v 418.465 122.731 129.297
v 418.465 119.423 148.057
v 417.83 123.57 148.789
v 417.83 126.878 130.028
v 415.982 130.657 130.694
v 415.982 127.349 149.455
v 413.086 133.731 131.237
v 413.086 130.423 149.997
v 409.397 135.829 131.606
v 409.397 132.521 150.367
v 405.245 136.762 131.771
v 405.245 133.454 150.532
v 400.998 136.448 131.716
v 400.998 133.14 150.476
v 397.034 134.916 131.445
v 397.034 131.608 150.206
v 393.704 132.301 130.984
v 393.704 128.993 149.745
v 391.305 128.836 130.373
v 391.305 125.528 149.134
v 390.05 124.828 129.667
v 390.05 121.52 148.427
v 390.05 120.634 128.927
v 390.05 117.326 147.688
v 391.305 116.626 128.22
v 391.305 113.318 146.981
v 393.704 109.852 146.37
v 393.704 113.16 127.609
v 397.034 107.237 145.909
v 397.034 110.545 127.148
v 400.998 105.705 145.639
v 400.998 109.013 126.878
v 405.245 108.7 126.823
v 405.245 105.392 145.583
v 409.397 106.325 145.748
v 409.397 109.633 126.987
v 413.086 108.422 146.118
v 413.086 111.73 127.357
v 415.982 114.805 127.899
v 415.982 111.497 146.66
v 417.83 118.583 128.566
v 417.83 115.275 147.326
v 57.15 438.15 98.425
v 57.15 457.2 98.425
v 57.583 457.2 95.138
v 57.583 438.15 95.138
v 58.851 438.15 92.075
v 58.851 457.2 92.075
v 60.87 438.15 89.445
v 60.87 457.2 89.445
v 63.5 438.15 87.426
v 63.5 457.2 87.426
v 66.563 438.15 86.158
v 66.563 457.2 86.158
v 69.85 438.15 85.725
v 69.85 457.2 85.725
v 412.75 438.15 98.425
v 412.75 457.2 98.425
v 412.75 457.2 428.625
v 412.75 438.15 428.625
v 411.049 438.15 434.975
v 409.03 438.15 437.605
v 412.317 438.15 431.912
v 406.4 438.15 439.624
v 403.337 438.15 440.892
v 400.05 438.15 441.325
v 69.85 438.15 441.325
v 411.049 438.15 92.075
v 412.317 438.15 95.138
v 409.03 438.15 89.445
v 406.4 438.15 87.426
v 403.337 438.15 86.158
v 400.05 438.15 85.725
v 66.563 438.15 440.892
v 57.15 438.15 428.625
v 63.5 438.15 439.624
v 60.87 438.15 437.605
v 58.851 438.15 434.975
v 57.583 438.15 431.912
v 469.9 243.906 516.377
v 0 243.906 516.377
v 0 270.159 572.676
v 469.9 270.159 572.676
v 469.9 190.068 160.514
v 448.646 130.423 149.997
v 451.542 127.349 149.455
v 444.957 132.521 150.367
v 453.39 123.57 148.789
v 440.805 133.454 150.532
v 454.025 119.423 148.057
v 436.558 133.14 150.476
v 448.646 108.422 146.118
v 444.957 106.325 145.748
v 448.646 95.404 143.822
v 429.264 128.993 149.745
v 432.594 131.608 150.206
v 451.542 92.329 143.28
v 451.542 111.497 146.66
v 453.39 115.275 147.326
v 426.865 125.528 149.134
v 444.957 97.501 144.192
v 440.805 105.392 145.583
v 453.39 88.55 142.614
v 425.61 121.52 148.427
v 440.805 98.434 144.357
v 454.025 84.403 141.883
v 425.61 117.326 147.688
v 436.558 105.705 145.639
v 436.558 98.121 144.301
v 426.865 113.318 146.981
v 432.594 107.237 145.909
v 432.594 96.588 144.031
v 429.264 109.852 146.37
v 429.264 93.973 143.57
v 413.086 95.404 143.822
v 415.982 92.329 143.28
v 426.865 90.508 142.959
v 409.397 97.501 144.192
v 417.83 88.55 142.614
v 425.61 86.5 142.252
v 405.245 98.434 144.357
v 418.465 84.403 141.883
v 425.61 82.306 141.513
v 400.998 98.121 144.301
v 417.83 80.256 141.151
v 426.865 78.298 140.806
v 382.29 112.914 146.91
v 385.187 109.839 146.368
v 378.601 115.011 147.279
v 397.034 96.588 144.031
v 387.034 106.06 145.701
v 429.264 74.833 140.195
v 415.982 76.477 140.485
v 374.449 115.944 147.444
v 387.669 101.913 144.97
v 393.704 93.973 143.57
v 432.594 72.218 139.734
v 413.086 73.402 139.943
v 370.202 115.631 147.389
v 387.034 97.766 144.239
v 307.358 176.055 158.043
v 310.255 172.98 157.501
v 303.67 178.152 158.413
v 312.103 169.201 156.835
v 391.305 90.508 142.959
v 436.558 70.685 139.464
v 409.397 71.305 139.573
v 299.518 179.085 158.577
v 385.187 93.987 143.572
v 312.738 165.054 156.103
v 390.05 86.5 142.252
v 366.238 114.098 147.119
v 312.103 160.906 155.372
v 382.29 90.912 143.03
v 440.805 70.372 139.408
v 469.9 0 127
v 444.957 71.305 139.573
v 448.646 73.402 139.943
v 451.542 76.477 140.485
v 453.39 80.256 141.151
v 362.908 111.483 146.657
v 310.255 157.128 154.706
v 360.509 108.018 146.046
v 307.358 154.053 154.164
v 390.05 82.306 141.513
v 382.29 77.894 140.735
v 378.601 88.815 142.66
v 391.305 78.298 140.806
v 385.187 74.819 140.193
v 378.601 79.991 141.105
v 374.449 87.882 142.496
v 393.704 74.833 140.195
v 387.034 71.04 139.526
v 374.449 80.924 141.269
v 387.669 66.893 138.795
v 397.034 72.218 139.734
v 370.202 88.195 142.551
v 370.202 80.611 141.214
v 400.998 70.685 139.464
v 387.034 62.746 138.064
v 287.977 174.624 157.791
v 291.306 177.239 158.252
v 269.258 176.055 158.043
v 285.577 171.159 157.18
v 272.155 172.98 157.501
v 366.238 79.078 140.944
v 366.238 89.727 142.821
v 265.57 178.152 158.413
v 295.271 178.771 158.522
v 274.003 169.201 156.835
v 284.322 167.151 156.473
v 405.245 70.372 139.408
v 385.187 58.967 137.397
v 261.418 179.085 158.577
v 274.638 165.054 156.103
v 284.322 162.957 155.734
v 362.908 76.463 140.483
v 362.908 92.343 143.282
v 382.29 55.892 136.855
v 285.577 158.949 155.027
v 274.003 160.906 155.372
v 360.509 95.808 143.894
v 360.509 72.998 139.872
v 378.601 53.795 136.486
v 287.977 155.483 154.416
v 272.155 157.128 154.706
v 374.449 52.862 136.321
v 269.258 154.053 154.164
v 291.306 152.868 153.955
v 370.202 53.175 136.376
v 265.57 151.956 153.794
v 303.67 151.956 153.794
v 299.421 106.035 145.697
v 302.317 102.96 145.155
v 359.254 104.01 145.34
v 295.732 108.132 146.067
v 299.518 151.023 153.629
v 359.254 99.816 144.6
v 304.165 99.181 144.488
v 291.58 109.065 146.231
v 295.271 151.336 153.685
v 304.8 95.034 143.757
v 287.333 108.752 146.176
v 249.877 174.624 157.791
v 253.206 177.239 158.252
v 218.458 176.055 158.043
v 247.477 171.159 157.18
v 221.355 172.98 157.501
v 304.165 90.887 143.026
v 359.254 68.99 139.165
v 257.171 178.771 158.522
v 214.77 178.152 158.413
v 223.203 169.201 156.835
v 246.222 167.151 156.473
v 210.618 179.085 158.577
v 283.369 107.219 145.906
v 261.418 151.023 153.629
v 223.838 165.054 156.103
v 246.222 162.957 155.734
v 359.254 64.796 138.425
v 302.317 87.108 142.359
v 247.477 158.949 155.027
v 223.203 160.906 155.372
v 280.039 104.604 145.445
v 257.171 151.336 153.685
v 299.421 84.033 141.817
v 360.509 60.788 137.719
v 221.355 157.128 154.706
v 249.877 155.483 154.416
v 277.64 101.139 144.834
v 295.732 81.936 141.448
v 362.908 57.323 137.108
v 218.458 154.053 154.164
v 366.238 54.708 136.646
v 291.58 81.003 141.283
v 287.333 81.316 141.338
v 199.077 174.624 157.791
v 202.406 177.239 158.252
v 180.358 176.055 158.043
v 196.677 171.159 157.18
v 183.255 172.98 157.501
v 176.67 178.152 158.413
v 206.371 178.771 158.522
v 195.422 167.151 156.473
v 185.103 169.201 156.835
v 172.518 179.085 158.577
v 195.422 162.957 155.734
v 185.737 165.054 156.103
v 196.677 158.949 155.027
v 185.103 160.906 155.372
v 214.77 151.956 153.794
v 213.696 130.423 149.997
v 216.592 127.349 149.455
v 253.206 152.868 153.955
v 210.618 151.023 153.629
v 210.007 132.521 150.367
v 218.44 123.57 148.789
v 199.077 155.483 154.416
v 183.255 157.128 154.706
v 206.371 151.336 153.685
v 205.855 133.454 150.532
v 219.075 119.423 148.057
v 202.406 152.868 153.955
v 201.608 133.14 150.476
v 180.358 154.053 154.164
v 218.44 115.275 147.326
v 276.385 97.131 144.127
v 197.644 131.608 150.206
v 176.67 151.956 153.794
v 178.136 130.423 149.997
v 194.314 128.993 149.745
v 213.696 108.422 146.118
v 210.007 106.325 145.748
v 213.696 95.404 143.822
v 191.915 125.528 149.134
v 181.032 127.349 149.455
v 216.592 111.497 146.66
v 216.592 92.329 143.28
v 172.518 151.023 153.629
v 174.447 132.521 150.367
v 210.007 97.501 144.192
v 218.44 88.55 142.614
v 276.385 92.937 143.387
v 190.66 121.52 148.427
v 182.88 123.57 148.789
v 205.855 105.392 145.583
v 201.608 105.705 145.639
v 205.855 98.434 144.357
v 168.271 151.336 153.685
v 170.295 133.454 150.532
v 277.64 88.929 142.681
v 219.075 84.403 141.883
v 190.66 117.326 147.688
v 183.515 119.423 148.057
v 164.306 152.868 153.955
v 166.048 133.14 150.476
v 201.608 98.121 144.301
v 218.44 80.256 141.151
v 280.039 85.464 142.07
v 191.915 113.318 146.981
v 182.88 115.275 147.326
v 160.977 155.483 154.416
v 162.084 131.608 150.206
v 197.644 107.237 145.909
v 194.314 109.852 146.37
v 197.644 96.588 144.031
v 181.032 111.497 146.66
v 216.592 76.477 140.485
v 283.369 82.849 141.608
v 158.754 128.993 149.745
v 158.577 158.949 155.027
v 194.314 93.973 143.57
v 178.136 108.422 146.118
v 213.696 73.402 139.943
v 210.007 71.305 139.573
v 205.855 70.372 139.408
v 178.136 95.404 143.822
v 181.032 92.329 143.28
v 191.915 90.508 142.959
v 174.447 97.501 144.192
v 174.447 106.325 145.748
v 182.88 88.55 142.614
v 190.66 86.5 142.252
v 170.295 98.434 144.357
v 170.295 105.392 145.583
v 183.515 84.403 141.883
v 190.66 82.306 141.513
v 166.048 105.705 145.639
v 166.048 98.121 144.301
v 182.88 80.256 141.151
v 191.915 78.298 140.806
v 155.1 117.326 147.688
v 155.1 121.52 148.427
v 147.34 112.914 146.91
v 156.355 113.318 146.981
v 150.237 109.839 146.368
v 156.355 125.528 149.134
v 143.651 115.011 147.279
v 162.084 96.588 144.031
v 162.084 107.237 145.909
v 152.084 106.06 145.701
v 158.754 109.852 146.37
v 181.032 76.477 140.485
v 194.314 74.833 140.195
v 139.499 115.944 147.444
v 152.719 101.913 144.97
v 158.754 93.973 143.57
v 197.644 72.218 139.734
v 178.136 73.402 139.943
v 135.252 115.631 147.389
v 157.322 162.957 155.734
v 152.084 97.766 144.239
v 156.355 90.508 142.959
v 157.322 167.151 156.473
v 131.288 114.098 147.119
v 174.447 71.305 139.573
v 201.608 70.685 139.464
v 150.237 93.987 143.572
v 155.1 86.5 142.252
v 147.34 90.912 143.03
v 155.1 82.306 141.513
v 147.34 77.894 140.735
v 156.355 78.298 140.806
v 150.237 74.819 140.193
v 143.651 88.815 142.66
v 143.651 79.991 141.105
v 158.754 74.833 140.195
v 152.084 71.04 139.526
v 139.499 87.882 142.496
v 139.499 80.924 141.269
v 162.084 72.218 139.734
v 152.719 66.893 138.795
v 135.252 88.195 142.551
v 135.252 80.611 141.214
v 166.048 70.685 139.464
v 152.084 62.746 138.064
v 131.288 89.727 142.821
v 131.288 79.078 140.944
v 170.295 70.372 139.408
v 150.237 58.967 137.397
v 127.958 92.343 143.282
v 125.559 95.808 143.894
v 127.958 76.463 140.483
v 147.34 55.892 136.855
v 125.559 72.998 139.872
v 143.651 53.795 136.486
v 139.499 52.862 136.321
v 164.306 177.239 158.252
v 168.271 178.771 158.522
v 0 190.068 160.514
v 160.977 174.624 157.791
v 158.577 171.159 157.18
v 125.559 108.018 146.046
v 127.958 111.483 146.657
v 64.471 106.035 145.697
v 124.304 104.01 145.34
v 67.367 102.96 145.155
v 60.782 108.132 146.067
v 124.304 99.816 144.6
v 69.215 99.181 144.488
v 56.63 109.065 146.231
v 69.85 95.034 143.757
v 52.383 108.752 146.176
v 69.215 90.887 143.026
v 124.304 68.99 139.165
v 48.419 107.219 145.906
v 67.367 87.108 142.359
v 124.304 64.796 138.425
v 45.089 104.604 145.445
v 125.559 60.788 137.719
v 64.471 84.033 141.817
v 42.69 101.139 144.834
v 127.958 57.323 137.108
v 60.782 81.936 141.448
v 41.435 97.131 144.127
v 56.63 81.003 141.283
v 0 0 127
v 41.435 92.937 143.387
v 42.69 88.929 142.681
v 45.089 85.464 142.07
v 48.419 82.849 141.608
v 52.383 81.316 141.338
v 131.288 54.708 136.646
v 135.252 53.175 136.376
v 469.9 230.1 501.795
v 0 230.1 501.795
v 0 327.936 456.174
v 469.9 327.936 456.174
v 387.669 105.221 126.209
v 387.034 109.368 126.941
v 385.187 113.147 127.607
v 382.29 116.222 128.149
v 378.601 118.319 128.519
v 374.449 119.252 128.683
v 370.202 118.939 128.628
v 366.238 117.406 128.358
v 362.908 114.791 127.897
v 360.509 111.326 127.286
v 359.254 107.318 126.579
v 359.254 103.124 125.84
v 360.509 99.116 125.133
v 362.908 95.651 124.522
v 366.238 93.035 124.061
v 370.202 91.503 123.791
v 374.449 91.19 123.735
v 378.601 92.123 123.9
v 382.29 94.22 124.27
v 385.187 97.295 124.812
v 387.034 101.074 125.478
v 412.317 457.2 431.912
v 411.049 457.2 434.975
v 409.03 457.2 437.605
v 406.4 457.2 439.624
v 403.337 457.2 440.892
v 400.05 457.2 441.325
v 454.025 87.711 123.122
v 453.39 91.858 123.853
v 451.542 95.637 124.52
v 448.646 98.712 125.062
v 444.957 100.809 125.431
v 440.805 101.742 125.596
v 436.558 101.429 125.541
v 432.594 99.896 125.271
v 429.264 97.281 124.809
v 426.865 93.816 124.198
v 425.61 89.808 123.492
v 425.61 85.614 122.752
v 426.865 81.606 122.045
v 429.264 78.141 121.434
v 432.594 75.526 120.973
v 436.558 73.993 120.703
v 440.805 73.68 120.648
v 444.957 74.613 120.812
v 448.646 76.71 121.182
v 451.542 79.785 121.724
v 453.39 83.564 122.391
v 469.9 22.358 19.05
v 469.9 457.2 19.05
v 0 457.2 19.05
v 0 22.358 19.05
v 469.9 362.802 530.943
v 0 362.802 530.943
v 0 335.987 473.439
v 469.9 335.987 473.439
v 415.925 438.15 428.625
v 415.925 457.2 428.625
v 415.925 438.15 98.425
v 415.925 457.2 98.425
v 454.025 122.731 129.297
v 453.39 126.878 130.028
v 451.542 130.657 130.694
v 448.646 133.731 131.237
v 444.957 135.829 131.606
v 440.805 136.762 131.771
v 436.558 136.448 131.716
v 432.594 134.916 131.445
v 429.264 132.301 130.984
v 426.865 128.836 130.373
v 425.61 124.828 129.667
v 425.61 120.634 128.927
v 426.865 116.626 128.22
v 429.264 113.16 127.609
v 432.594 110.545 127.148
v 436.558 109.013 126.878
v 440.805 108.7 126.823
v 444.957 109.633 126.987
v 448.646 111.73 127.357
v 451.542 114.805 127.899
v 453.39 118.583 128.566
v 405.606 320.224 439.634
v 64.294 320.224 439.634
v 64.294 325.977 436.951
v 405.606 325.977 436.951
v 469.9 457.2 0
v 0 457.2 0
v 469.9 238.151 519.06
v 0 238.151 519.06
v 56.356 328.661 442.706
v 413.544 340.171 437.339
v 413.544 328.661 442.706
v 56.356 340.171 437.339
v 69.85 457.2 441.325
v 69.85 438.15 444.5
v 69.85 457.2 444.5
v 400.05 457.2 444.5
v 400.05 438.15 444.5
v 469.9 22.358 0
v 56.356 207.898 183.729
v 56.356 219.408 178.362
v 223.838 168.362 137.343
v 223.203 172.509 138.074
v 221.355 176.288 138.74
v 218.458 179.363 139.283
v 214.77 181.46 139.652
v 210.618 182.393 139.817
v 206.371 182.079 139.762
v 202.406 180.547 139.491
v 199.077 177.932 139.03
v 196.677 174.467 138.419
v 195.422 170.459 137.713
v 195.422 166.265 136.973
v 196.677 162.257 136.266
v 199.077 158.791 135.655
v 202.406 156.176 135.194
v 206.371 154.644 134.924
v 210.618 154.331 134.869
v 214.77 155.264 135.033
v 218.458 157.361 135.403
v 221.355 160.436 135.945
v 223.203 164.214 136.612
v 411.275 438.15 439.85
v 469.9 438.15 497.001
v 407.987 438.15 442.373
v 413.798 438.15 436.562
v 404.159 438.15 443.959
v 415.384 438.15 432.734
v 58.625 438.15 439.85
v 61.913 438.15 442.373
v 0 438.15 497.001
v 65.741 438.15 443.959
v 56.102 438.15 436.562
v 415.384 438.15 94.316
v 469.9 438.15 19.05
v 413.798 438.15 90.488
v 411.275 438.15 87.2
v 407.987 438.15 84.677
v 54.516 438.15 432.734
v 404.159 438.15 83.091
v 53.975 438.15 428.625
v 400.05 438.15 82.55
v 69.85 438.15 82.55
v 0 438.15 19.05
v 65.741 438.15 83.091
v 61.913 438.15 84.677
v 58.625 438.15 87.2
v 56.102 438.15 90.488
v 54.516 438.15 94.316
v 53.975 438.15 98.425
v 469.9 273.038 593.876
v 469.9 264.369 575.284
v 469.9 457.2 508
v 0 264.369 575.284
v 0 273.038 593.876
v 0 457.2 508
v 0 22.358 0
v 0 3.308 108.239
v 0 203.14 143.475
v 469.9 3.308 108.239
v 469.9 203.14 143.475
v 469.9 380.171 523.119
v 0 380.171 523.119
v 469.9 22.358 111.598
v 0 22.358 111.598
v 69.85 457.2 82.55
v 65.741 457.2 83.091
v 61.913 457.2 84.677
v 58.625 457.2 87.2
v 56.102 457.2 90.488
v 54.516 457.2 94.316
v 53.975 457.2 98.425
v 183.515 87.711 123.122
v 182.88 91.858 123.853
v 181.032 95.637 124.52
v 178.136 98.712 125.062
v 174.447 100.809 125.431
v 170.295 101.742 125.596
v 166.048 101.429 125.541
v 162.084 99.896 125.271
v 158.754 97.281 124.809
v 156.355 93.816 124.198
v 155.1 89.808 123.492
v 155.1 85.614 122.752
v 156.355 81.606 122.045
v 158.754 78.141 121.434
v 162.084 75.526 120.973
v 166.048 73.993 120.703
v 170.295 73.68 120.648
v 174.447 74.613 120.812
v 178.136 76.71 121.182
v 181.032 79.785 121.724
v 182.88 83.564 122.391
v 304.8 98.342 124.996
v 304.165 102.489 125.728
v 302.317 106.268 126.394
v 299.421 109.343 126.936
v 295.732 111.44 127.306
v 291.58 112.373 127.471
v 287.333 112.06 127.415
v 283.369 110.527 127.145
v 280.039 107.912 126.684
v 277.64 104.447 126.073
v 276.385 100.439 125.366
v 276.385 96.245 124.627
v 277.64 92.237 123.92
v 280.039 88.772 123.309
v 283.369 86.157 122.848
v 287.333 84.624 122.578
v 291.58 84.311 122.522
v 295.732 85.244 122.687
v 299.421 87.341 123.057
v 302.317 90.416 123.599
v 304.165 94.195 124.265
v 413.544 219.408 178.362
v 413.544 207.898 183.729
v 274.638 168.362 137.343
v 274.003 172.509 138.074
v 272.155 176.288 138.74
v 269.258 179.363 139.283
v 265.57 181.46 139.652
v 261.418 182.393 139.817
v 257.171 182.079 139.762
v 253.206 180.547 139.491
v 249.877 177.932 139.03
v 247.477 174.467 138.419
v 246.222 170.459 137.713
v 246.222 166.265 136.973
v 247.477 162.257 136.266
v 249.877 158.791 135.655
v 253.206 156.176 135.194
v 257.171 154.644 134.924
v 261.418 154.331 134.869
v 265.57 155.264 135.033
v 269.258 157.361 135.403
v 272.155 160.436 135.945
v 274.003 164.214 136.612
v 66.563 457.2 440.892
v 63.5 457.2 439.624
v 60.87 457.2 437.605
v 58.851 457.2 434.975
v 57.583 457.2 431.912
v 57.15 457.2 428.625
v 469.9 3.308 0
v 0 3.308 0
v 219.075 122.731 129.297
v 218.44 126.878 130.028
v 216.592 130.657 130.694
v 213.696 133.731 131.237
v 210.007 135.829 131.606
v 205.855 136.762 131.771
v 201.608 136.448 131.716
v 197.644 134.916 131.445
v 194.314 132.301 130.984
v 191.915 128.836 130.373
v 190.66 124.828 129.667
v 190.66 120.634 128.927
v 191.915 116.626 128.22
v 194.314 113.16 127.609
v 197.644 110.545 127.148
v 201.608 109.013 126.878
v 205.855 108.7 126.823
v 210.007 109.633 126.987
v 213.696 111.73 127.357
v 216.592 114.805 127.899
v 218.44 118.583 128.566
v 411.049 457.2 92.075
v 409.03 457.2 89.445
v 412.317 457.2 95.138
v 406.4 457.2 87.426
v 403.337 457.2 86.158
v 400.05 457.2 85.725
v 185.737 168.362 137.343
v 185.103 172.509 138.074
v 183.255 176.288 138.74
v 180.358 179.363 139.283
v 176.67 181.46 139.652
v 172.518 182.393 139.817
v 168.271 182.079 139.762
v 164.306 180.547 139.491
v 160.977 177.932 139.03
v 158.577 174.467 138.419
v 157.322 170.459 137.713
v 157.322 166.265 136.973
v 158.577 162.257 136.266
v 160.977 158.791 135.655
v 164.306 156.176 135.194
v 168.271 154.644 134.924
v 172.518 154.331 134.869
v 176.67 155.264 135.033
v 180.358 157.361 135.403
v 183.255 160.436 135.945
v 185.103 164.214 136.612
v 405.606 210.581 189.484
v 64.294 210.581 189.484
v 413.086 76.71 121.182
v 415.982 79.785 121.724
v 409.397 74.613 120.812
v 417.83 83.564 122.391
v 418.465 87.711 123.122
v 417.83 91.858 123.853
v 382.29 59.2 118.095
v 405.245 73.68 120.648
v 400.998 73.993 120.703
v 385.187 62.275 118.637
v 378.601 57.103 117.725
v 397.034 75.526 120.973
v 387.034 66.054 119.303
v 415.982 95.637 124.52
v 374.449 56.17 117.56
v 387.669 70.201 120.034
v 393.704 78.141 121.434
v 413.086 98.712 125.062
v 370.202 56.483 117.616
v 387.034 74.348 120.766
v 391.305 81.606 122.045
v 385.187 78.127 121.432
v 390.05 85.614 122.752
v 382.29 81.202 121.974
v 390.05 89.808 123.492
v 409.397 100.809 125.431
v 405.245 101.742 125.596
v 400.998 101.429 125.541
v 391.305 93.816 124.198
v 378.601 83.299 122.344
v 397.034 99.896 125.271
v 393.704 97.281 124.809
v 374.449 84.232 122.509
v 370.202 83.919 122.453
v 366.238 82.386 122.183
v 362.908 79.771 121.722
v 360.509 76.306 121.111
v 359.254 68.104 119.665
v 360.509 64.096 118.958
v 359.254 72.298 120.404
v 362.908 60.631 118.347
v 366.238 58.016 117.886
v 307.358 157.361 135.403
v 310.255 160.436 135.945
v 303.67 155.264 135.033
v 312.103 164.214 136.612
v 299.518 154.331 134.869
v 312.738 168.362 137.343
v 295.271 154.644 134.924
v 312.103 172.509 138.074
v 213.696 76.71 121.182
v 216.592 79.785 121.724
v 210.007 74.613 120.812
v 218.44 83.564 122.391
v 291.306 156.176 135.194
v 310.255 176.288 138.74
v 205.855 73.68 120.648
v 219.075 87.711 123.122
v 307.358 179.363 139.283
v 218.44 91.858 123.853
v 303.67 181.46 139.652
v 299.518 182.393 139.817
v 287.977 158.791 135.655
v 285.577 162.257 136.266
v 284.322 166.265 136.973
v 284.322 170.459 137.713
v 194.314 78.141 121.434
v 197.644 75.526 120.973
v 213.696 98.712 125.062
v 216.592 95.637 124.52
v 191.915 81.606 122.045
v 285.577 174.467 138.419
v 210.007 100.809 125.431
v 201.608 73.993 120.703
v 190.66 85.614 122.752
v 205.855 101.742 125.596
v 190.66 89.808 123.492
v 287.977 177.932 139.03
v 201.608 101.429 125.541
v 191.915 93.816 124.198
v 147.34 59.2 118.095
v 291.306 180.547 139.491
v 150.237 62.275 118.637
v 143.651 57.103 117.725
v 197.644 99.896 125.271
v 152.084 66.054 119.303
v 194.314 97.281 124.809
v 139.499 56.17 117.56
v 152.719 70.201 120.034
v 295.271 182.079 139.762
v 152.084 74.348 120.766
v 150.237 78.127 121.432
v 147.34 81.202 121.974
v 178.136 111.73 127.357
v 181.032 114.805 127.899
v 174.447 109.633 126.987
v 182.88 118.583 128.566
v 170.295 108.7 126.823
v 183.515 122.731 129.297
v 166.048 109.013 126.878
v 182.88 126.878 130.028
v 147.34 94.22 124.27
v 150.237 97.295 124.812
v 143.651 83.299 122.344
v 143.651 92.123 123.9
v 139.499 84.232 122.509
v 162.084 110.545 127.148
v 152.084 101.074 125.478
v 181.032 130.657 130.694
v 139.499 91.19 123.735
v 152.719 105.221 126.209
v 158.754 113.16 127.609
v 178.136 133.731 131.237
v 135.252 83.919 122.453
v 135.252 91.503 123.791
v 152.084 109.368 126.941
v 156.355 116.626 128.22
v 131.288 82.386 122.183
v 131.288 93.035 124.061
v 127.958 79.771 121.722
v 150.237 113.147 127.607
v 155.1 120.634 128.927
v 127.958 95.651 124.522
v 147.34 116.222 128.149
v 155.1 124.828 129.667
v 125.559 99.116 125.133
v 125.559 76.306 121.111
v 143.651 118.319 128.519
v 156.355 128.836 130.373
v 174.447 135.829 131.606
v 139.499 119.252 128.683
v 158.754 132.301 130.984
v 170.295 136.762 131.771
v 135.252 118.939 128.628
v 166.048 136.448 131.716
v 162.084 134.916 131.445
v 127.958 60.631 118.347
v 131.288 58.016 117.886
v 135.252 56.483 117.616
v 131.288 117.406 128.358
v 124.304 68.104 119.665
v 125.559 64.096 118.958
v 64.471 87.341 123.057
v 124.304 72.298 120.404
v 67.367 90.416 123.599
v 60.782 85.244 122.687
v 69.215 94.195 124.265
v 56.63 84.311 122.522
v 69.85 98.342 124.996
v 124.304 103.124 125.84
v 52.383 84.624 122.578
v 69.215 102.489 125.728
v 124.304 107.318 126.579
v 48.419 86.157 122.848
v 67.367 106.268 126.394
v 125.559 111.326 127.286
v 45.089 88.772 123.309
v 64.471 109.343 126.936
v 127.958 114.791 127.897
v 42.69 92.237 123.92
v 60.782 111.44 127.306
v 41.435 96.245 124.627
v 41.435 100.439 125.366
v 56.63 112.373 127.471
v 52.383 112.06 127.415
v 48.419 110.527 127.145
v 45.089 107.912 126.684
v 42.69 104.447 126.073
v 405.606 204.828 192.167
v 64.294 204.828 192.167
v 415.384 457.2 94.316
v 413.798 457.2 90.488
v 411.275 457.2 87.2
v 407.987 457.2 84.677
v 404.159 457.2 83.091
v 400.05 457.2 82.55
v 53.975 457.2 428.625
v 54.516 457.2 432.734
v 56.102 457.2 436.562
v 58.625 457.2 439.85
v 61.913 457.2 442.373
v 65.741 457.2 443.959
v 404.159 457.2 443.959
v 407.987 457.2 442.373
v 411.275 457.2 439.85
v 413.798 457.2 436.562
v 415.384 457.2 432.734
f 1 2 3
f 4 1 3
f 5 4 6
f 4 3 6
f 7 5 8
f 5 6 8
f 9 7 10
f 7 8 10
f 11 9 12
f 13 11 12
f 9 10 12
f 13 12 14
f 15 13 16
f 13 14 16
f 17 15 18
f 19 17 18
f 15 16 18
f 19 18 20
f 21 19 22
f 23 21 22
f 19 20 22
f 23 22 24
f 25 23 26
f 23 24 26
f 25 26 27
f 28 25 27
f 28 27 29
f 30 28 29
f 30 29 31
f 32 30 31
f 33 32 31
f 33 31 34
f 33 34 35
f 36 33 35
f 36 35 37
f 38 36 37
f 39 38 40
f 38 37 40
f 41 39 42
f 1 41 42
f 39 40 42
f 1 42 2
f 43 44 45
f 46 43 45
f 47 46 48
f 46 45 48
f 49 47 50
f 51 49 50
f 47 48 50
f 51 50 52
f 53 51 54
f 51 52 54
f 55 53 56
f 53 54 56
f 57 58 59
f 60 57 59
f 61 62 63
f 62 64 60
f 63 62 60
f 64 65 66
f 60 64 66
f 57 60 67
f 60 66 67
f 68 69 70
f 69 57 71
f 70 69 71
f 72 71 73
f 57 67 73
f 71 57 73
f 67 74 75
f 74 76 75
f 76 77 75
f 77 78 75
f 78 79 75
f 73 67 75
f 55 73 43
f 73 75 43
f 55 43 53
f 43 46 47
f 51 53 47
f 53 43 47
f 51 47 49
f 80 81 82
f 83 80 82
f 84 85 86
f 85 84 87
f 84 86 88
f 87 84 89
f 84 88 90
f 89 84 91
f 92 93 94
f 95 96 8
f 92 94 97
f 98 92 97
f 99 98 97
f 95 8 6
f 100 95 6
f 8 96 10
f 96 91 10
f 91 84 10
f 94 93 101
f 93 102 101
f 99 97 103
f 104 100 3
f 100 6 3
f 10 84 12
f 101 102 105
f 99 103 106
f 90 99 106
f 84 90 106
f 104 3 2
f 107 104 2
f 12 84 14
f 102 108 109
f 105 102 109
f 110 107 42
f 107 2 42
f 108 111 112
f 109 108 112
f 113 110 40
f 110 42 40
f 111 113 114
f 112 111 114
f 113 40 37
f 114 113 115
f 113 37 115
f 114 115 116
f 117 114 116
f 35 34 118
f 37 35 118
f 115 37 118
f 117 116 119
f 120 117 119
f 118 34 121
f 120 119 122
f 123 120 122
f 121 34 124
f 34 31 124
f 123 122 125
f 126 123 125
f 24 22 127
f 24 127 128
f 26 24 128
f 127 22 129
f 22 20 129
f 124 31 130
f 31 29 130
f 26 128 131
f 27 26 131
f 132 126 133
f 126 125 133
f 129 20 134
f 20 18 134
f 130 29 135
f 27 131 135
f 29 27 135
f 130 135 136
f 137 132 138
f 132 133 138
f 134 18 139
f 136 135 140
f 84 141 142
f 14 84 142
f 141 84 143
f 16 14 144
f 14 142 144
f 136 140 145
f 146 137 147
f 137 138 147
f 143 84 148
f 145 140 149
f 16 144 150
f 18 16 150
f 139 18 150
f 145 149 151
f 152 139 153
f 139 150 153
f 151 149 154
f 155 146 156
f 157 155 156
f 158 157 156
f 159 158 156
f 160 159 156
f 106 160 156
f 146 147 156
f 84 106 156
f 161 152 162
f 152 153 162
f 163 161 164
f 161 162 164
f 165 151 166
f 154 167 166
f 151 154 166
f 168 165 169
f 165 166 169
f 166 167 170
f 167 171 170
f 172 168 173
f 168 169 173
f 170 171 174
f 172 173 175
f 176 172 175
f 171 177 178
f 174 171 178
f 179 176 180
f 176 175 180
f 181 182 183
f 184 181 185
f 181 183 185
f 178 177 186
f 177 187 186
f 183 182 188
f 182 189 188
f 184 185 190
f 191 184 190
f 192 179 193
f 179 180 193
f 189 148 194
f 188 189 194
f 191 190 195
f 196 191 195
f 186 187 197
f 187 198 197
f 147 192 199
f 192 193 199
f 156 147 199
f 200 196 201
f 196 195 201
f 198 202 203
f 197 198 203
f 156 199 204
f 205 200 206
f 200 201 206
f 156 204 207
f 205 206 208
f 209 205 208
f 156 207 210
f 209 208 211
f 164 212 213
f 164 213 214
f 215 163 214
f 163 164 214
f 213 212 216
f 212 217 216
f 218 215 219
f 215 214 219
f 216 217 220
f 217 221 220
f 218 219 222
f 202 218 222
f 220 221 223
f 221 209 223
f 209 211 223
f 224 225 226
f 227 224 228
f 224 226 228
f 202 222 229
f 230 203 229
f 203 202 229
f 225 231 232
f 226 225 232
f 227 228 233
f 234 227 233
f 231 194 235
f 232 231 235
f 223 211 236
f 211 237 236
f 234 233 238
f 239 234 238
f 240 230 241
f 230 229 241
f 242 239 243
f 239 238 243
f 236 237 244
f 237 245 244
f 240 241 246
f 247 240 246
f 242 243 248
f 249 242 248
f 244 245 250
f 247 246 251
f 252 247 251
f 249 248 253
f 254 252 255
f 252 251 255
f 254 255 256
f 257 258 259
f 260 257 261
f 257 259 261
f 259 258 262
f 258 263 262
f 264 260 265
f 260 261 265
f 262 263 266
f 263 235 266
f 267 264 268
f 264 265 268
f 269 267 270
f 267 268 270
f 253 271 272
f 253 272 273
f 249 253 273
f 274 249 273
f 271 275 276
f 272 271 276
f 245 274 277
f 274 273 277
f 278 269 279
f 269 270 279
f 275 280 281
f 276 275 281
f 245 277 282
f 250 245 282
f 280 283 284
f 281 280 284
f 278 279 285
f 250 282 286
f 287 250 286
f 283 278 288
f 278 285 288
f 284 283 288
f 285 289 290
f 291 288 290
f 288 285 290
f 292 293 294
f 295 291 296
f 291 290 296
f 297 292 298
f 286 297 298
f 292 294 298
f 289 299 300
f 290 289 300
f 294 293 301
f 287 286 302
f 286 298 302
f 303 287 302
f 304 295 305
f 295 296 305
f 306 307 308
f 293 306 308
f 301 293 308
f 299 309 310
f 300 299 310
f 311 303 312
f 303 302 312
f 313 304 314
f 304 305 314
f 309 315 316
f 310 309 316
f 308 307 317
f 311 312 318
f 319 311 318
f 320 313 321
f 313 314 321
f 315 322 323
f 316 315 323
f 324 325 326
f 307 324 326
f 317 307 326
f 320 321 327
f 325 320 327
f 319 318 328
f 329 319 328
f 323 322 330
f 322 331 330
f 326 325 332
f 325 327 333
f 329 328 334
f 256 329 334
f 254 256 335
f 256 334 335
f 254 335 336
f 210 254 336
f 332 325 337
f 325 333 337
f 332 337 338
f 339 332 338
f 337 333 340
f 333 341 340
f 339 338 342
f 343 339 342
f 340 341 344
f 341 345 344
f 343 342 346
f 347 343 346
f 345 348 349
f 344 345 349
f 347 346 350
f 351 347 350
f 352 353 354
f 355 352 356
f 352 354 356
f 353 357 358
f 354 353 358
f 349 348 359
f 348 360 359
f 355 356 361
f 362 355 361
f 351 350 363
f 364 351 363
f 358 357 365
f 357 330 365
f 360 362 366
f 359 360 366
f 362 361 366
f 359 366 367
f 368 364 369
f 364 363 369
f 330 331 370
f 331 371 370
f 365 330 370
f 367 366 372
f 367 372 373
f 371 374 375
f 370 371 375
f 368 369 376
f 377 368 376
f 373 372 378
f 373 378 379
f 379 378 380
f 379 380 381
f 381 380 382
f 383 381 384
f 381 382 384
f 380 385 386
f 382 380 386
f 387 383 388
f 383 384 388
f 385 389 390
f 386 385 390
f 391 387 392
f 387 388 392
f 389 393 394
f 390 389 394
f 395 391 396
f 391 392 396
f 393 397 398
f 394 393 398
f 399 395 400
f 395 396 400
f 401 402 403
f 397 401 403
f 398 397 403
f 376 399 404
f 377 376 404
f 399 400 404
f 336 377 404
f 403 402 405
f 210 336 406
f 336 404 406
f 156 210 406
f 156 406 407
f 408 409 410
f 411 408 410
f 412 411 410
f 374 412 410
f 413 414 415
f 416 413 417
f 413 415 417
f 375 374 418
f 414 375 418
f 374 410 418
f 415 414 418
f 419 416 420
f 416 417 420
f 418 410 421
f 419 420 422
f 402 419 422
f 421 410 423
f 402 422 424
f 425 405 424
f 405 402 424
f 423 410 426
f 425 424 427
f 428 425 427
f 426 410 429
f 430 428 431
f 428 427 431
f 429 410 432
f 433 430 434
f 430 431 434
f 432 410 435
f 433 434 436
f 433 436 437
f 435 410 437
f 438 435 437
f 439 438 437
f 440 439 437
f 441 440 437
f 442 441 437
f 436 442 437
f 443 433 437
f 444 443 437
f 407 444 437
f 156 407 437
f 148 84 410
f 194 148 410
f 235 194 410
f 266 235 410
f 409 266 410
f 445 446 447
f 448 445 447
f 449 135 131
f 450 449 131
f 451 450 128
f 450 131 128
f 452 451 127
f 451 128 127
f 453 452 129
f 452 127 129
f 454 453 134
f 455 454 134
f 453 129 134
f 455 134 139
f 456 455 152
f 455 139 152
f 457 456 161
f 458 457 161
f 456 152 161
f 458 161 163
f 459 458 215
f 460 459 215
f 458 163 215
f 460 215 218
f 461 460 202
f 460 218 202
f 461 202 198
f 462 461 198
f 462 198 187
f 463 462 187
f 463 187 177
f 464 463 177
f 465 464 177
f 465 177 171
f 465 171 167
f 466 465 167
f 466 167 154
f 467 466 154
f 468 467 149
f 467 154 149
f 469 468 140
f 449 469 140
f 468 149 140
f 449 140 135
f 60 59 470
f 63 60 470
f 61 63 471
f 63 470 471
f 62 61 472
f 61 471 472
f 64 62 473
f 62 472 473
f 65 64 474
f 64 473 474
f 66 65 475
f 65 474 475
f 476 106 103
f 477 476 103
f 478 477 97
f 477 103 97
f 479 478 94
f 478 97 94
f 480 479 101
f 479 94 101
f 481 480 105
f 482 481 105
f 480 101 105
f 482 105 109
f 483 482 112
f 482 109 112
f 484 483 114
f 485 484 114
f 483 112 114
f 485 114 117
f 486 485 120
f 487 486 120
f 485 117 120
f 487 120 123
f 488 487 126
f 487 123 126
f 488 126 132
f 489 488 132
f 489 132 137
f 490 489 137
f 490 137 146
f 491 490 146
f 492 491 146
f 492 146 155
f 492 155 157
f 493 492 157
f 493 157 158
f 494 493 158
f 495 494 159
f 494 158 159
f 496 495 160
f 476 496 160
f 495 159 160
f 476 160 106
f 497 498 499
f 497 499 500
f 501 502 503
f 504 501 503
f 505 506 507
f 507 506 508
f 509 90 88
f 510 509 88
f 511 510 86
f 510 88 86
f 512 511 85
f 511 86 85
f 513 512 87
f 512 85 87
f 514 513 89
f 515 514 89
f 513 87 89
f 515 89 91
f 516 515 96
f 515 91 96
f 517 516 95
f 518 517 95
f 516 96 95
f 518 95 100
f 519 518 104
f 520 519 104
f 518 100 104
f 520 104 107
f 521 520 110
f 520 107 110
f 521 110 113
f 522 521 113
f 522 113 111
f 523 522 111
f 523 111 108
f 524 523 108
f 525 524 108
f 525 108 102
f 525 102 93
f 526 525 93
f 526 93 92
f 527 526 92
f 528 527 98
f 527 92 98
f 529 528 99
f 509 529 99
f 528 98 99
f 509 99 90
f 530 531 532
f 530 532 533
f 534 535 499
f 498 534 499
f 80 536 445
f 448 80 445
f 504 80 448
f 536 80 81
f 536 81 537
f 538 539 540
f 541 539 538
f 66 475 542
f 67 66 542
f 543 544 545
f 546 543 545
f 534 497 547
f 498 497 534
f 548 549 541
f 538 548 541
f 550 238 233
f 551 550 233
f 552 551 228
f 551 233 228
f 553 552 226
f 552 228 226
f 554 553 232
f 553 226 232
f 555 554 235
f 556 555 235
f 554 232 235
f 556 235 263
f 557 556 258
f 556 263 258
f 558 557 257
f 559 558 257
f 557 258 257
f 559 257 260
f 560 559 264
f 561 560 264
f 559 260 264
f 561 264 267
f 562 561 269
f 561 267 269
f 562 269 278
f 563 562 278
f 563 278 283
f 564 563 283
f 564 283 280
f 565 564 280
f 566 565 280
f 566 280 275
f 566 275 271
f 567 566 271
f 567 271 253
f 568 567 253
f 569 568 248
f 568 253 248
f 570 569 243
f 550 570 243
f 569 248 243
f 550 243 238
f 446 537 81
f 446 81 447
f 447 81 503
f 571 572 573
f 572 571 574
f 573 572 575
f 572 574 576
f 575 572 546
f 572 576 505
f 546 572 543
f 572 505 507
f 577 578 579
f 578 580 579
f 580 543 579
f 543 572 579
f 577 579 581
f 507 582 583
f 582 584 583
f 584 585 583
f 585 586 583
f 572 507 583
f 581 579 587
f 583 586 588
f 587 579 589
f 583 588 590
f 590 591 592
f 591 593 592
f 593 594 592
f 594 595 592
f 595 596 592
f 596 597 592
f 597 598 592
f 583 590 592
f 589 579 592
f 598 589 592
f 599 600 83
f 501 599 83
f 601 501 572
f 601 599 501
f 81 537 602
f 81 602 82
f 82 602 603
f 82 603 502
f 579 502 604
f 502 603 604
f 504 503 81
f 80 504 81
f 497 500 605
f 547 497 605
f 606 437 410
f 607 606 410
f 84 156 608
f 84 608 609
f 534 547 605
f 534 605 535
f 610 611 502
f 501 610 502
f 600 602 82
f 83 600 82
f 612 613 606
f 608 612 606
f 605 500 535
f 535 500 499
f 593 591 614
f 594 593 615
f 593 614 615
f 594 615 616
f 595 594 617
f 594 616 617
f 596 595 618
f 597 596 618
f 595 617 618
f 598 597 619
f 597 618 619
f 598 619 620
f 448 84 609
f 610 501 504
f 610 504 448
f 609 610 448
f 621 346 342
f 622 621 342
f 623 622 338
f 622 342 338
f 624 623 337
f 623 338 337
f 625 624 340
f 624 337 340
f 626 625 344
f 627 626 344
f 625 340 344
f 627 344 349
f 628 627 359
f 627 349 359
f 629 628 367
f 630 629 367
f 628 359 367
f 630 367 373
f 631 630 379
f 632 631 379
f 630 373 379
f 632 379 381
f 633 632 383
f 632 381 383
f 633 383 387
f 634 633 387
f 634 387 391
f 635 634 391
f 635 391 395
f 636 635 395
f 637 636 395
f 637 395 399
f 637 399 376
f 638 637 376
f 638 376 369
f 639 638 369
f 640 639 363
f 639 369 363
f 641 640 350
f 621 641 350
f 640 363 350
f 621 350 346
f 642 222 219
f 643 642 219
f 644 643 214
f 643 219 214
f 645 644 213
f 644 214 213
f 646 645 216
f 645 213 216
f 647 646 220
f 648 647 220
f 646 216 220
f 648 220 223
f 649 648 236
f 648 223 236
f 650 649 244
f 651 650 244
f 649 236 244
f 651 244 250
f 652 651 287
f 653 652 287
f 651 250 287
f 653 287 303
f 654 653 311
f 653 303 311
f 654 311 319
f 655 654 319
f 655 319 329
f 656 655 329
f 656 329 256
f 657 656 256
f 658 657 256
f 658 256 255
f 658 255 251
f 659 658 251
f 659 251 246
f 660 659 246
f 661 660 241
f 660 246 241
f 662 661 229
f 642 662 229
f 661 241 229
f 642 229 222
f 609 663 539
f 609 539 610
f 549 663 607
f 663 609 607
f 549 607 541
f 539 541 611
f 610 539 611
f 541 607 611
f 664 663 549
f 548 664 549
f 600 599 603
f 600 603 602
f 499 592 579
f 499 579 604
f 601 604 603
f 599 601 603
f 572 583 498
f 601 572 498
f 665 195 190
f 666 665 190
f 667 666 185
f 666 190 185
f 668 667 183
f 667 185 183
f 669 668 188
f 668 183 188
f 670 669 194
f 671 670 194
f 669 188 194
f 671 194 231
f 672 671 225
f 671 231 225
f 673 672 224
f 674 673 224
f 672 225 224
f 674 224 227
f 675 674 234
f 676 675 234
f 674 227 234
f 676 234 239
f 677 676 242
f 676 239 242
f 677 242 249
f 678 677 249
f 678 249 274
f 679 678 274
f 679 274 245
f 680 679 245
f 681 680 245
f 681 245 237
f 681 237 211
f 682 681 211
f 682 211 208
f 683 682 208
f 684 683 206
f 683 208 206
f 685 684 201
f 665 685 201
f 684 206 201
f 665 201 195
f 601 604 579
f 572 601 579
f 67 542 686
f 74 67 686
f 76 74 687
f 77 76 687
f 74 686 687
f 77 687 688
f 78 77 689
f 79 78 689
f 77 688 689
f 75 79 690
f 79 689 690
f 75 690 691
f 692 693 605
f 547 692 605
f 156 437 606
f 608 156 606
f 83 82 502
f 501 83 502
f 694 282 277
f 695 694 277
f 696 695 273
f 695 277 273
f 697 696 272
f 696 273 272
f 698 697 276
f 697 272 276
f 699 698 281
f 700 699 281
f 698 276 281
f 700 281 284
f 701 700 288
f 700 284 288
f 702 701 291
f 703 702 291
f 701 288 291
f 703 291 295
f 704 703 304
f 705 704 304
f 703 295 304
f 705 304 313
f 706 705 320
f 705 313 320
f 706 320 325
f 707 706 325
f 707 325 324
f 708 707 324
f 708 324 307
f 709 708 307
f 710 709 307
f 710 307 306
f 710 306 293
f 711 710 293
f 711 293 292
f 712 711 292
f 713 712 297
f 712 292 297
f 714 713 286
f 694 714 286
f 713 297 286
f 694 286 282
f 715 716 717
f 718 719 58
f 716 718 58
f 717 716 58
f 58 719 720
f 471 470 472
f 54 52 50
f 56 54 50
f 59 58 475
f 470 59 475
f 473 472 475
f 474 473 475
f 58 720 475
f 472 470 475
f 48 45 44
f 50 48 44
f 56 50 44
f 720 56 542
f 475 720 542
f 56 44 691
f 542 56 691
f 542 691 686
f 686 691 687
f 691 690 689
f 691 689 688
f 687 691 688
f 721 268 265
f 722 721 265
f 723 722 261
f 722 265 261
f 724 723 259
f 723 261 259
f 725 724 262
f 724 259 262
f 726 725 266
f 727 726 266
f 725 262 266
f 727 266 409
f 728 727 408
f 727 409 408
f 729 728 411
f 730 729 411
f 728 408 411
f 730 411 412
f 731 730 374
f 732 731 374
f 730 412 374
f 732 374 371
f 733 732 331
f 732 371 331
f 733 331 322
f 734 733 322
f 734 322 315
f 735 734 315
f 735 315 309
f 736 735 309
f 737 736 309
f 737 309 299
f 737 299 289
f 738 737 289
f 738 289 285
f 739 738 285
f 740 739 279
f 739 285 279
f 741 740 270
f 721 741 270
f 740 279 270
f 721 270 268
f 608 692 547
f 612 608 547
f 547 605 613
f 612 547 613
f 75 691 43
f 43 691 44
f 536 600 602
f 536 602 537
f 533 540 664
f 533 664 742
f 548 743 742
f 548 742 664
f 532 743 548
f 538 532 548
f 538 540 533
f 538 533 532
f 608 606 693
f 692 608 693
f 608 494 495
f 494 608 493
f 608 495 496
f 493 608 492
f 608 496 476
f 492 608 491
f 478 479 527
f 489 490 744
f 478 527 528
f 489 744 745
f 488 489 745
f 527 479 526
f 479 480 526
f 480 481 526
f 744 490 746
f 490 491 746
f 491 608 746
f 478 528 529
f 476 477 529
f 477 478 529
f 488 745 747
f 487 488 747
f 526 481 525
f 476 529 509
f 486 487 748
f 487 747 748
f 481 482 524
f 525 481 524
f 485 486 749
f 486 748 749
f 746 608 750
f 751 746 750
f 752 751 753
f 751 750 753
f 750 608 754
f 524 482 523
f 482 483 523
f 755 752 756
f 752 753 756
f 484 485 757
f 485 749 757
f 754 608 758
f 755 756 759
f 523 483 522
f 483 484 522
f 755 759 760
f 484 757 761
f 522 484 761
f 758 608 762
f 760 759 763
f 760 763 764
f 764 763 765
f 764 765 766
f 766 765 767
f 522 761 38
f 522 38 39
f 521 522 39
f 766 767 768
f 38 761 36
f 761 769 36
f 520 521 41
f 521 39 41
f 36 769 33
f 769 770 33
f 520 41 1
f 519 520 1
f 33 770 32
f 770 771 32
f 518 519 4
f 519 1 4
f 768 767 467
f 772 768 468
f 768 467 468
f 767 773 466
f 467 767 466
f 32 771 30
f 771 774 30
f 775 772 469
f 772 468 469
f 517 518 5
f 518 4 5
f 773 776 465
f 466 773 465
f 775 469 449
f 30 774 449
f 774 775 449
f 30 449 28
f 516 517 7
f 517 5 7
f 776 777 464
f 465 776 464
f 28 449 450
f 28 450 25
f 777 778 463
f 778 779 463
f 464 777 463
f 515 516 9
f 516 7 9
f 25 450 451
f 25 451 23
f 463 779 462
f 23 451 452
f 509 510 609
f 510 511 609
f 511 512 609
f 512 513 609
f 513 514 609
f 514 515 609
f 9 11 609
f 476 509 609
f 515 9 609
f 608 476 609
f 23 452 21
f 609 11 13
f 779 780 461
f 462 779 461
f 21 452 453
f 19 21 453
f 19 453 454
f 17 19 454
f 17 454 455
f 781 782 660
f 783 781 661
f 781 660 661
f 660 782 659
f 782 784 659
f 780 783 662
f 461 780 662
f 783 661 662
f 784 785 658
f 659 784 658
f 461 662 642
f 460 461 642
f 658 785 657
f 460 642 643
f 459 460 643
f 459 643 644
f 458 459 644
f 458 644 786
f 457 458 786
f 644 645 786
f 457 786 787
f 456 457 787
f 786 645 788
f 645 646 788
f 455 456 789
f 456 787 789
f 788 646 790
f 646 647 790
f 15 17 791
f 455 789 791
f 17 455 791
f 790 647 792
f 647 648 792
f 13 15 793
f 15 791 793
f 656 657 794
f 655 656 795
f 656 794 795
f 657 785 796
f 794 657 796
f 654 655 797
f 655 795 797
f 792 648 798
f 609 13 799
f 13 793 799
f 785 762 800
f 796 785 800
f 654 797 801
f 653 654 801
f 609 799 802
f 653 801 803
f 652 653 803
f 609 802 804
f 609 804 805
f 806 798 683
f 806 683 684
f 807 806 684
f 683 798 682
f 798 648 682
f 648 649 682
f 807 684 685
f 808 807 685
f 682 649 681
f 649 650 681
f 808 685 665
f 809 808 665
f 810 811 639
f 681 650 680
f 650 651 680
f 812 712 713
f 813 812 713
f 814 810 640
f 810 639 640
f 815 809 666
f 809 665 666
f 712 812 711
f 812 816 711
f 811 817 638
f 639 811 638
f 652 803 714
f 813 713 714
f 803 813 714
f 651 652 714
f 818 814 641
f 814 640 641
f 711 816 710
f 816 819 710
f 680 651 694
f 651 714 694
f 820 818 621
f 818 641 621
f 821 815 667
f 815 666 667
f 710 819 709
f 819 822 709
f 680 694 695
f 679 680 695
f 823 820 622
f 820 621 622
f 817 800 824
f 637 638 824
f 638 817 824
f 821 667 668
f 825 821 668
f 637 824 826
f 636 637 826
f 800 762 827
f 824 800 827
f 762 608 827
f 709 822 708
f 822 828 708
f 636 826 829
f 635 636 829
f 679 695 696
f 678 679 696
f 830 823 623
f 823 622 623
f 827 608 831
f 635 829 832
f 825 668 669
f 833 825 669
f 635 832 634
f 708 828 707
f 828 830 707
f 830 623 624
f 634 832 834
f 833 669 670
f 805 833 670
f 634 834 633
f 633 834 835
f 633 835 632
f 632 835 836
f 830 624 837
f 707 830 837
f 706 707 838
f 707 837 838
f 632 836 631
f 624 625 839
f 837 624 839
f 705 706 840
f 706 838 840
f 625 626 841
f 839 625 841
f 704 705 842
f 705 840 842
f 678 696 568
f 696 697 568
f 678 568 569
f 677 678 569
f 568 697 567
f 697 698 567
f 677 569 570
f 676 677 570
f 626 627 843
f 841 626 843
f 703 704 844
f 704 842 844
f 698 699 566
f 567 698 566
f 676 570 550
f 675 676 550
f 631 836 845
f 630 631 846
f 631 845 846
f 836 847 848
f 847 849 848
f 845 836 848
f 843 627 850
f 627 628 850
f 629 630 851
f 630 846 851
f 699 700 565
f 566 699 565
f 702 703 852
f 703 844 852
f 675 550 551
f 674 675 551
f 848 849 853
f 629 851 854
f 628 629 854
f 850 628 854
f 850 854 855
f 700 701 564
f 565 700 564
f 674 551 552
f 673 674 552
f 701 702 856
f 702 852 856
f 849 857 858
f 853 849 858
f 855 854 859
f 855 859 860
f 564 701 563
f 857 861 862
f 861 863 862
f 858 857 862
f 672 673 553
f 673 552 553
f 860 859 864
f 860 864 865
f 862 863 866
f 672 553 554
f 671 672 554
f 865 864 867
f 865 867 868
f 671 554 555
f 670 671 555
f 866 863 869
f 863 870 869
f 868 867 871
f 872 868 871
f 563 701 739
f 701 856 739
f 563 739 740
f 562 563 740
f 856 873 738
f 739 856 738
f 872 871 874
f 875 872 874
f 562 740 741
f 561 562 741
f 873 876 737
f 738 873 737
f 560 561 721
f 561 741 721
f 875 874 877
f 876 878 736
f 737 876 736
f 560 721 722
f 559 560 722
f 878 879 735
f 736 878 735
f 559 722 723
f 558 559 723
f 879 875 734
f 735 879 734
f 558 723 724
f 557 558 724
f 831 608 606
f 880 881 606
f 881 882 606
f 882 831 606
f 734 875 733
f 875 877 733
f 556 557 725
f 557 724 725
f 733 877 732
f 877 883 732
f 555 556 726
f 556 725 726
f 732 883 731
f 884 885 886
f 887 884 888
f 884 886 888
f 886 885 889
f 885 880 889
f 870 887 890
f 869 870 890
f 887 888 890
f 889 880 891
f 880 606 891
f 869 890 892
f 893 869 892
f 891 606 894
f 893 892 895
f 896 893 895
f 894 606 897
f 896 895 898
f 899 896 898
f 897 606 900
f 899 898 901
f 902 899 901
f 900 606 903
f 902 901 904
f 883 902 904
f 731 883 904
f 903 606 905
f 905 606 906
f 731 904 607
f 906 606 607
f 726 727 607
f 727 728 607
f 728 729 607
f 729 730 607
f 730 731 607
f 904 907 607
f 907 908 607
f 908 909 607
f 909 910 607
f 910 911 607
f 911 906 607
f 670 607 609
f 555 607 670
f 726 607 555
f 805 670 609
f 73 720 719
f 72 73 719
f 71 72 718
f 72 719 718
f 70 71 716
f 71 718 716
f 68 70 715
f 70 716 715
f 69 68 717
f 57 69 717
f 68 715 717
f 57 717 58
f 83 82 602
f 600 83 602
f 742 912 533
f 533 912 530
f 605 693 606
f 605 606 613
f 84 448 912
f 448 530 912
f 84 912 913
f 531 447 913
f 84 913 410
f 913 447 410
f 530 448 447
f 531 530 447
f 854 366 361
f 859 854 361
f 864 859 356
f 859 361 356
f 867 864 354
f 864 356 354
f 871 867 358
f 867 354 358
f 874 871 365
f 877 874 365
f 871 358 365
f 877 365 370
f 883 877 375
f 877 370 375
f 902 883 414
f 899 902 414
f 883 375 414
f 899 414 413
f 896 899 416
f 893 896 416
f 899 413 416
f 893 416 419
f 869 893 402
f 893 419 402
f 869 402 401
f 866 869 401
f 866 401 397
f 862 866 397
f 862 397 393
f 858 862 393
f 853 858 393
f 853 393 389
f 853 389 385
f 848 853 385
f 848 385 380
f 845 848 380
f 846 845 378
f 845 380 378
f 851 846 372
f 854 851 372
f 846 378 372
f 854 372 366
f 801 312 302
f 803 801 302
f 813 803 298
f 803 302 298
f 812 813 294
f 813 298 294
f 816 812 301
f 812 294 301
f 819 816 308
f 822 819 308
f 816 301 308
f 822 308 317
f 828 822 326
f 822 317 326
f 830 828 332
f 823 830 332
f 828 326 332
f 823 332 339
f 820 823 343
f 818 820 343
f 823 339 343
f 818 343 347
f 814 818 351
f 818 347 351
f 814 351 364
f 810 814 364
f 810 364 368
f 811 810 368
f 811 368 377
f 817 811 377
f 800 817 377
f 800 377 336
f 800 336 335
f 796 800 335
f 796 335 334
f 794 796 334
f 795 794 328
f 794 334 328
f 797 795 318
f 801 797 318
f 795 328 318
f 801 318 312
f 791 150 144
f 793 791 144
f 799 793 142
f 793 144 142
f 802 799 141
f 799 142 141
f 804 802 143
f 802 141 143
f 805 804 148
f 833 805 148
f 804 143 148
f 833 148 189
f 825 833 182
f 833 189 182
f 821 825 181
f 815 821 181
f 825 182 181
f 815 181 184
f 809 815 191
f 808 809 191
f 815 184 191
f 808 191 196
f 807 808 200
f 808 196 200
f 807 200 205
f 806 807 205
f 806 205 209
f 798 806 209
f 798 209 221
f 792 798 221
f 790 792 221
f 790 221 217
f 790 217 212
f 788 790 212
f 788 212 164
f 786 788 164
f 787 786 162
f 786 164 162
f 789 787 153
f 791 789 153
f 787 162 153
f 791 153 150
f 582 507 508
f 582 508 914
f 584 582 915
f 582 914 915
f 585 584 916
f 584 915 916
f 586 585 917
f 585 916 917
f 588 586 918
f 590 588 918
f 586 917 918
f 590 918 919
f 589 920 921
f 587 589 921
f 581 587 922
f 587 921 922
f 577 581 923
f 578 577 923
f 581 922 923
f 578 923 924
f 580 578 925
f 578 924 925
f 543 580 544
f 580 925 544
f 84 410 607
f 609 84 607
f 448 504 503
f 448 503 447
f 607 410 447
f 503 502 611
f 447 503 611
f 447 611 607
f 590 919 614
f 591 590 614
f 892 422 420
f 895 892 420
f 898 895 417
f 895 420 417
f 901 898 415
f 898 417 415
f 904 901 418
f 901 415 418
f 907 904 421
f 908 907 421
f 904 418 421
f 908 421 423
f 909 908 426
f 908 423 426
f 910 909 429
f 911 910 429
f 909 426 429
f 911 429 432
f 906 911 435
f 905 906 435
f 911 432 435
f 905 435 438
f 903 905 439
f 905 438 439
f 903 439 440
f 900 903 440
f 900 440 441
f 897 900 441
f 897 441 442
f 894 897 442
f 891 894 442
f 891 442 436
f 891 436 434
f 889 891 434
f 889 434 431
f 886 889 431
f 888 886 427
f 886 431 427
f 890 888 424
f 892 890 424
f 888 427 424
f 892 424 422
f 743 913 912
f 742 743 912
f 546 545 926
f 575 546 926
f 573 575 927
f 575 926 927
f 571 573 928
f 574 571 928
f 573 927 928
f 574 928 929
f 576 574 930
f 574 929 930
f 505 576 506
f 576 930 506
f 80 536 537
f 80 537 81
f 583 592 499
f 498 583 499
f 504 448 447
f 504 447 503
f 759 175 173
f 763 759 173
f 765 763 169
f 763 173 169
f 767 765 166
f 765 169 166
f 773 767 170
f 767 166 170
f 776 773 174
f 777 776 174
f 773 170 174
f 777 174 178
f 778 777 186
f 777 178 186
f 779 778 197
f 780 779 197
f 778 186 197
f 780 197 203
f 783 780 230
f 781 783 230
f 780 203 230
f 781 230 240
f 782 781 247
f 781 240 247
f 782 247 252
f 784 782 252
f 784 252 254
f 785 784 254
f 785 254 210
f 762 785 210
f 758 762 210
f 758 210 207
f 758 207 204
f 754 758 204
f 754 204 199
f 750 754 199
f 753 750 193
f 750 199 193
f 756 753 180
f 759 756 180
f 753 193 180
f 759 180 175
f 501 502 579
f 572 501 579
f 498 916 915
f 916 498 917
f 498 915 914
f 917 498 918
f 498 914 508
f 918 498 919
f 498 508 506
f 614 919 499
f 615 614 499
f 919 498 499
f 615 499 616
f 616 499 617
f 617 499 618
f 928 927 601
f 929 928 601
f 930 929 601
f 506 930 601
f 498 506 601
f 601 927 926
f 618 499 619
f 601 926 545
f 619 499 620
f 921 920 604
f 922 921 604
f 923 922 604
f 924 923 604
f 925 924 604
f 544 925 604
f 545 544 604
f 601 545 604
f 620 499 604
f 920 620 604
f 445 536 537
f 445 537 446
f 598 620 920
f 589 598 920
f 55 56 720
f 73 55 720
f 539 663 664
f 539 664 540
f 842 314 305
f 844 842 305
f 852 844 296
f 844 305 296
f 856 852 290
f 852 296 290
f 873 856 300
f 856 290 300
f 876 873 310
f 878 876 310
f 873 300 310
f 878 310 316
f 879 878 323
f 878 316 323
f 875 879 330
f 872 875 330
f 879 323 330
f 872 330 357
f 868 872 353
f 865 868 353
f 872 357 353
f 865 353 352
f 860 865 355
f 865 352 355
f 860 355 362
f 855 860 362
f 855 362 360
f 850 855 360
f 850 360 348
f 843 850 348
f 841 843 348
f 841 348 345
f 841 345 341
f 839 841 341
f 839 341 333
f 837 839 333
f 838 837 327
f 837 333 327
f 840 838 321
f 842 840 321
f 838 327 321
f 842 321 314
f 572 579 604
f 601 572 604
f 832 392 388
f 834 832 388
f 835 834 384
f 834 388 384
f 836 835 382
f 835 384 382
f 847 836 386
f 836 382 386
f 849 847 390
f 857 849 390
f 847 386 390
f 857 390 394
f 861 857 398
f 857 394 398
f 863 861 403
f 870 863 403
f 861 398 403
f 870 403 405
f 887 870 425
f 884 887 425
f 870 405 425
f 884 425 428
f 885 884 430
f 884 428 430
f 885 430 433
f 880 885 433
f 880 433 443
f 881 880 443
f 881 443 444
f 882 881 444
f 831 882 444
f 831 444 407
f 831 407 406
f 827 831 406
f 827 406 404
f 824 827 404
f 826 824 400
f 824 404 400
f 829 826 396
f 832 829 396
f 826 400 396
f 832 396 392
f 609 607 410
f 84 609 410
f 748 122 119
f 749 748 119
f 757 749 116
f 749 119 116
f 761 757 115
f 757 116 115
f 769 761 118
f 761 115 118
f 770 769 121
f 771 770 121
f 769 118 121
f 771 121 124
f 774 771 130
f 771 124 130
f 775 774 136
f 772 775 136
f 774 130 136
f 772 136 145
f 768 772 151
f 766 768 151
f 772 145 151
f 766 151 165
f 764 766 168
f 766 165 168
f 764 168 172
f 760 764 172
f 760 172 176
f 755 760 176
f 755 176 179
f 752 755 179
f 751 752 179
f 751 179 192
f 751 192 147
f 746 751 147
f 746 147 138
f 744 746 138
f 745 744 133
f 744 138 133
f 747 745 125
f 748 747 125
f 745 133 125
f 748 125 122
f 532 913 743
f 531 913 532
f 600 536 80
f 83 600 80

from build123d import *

# Parameters (mm, degrees)
F1_DEPTH  = 469.9
F2_DEPTH  = 469.9
F3_DEPTH  = 469.9
F4_DEPTH  = 469.9
F5_DEPTH  = 469.9
F6_DEPTH  = 469.9
F7_DEPTH  = 469.9
F8_DEPTH  = 469.9
F9_R      = 14.2875
F10_DEPTH = 19.05
F11_W     = 341.3125
F11_H     = 273.05
F12_DEPTH = 19.05
F14_DEPTH = 19.05
F15_W     = 357.1875
F15_H     = 285.75
F15_W_2   = 341.3125
F15_H_2   = 273.05
F16_DEPTH = 12.7


with BuildPart() as f1:
    # F0 (on Right) → F1 (new body)
    with BuildSketch(Plane.YZ):
        Polygon((457.2, 19.05), (457.2, 508), (438.15, 497.0014773719), (438.15, 19.05), align=None)
    extrude(amount=F1_DEPTH)

    # F13 (on face) → F14 (cut)
    with BuildSketch(Plane(origin=(0, 457.2, 0), x_dir=(-1, 0, 0), z_dir=(0, 1, 0))):
        with BuildLine():
            Line((-400.05, 82.55), (-69.85, 82.55))
            ThreePointArc((-69.85, 82.55), (-58.6246798487, 87.1996798487), (-53.975, 98.425))
            Line((-53.975, 98.425), (-53.975, 428.625))
            ThreePointArc((-53.975, 428.625), (-58.6246798487, 439.8503201513), (-69.85, 444.5))
            Line((-69.85, 444.5), (-400.05, 444.5))
            ThreePointArc((-400.05, 444.5), (-411.2753201513, 439.8503201513), (-415.925, 428.625))
            Line((-415.925, 428.625), (-415.925, 98.425))
            ThreePointArc((-415.925, 98.425), (-411.2753201513, 87.1996798487), (-400.05, 82.55))
        make_face()
        with BuildLine():
            Line((-69.85, 85.725), (-400.05, 85.725))
            ThreePointArc((-400.05, 85.725), (-409.0302561211, 89.4447438789), (-412.75, 98.425))
            Line((-412.75, 98.425), (-412.75, 428.625))
            ThreePointArc((-412.75, 428.625), (-409.0302561211, 437.6052561211), (-400.05, 441.325))
            Line((-400.05, 441.325), (-69.85, 441.325))
            ThreePointArc((-69.85, 441.325), (-60.8697438789, 437.6052561211), (-57.15, 428.625))
            Line((-57.15, 428.625), (-57.15, 98.425))
            ThreePointArc((-57.15, 98.425), (-60.8697438789, 89.4447438789), (-69.85, 85.725))
        make_face(mode=Mode.SUBTRACT)
    extrude(amount=-F14_DEPTH, mode=Mode.SUBTRACT)


with BuildPart() as f2:
    # F0 (on Right) → F2 (new body)
    with BuildSketch(Plane.YZ):
        Polygon((438.15, 497.0014773719), (457.2, 508), (273.0382576742, 593.8760307857), (264.3687541785, 575.284220542), (270.1589392144, 572.6759323695), (362.8018997891, 530.94332161), (380.1709667192, 523.1191274677), align=None)
    extrude(amount=F2_DEPTH)


with BuildPart() as f3:
    # F0 (on Right) → F3 (new body)
    with BuildSketch(Plane.YZ):
        Polygon((457.2, 0), (457.2, 19.05), (438.15, 19.05), (22.3579977846, 19.05), (22.3579977846, 0), align=None)
    extrude(amount=F3_DEPTH)


with BuildPart() as f4:
    # F0 (on Right) → F4 (new body)
    with BuildSketch(Plane.YZ):
        Polygon((22.3579977846, 0), (22.3579977846, 19.05), (22.3579977846, 111.5984412876), (3.3079977846, 108.2394123051), (3.3079977846, 0), align=None)
    extrude(amount=F4_DEPTH)


with BuildPart() as f5:
    # F0 (on Right) → F5 (new body)
    with BuildSketch(Plane.YZ):
        Polygon((22.3579977846, 111.5984412876), (203.1400974051, 143.4752030798), (190.067917926, 160.5141020974), (0, 127), (3.3079977846, 108.2394123051), align=None)
    extrude(amount=F5_DEPTH)

    # F9 (on face) → F10 (cut)
    with BuildSketch(Plane(origin=(0, -21.7182791012, 123.1704814199), x_dir=(1, 0, 0), z_dir=(0, -0.1736481777, 0.984807753))):
        with Locations((138.4316366414, 125.5383295276)):
            Circle(F9_R)
        with Locations((138.4316366414, 89.9783295276)):
            Circle(F9_R)
        with Locations((169.2275, 107.7583295276)):
            Circle(F9_R)
        with Locations((169.2275, 143.3183295276)):
            Circle(F9_R)
        with Locations((204.7875, 143.3183295276)):
            Circle(F9_R)
        with Locations((204.7875, 107.7583295276)):
            Circle(F9_R)
        with Locations((171.45, 189.6533404915)):
            Circle(F9_R)
        with Locations((209.55, 189.6533404915)):
            Circle(F9_R)
        with Locations((55.5625, 118.5533295276)):
            Circle(F9_R)
        with Locations((260.35, 189.6533404915)):
            Circle(F9_R)
        with Locations((298.45, 189.6533404915)):
            Circle(F9_R)
        with Locations((290.5125, 118.5533295276)):
            Circle(F9_R)
        with Locations((373.3816366414, 89.9783295276)):
            Circle(F9_R)
        with Locations((373.3816366414, 125.5383295276)):
            Circle(F9_R)
        with Locations((404.1775, 107.7583295276)):
            Circle(F9_R)
        with Locations((404.1775, 143.3183295276)):
            Circle(F9_R)
        with Locations((439.7375, 143.3183295276)):
            Circle(F9_R)
        with Locations((439.7375, 107.7583295276)):
            Circle(F9_R)
    extrude(amount=-F10_DEPTH, mode=Mode.SUBTRACT)


with BuildPart() as f6:
    # F0 (on Right) → F6 (new body)
    with BuildSketch(Plane.YZ):
        Polygon((203.1400974051, 143.4752030798), (380.1709667192, 523.1191274677), (362.8018997891, 530.94332161), (335.9870457781, 473.4386816109), (327.9361678919, 456.1735182679), (190.067917926, 160.5141020974), align=None)
    extrude(amount=F6_DEPTH)

    # F11 (on face) → F12 (cut)
    with BuildSketch(Plane(origin=(0, 94.6401423069, -44.1314231266), x_dir=(1, 0, 0), z_dir=(0, -0.906307787, 0.4226182617))):
        with Locations((234.95, 397.2513537467)):
            Rectangle(F11_W, F11_H)
    extrude(amount=-F12_DEPTH, mode=Mode.SUBTRACT)

    # F15 (on face) → F16 (cut)
    with BuildSketch(Plane(origin=(0, 111.9038265015, -52.1816112745), x_dir=(-1, 0, 0), z_dir=(0, 0.906307787, -0.4226182617))):
        with Locations((-234.95, 397.2513537467)):
            Rectangle(F15_W, F15_H)
        with Locations((-234.95, 397.2513537467)):
            Rectangle(F15_W_2, F15_H_2, mode=Mode.SUBTRACT)
    extrude(amount=-F16_DEPTH, mode=Mode.SUBTRACT)


with BuildPart() as f7:
    # F0 (on Right) → F7 (new body)
    with BuildSketch(Plane.YZ):
        Polygon((243.9061746151, 516.3766970038), (238.1511201675, 519.0603229658), (230.1002422813, 501.7951596228), (327.9361678919, 456.1735182679), (335.9870457781, 473.4386816109), align=None)
    extrude(amount=F7_DEPTH)


with BuildPart() as f8:
    # F0 (on Right) → F8 (new body)
    with BuildSketch(Plane.YZ):
        Polygon((270.1589392144, 572.6759323695), (264.3687541785, 575.284220542), (238.1511201675, 519.0603229658), (243.9061746151, 516.3766970038), align=None)
    extrude(amount=F8_DEPTH)


solid = Compound([f1.part, f2.part, f3.part, f4.part, f5.part, f6.part, f7.part, f8.part])
